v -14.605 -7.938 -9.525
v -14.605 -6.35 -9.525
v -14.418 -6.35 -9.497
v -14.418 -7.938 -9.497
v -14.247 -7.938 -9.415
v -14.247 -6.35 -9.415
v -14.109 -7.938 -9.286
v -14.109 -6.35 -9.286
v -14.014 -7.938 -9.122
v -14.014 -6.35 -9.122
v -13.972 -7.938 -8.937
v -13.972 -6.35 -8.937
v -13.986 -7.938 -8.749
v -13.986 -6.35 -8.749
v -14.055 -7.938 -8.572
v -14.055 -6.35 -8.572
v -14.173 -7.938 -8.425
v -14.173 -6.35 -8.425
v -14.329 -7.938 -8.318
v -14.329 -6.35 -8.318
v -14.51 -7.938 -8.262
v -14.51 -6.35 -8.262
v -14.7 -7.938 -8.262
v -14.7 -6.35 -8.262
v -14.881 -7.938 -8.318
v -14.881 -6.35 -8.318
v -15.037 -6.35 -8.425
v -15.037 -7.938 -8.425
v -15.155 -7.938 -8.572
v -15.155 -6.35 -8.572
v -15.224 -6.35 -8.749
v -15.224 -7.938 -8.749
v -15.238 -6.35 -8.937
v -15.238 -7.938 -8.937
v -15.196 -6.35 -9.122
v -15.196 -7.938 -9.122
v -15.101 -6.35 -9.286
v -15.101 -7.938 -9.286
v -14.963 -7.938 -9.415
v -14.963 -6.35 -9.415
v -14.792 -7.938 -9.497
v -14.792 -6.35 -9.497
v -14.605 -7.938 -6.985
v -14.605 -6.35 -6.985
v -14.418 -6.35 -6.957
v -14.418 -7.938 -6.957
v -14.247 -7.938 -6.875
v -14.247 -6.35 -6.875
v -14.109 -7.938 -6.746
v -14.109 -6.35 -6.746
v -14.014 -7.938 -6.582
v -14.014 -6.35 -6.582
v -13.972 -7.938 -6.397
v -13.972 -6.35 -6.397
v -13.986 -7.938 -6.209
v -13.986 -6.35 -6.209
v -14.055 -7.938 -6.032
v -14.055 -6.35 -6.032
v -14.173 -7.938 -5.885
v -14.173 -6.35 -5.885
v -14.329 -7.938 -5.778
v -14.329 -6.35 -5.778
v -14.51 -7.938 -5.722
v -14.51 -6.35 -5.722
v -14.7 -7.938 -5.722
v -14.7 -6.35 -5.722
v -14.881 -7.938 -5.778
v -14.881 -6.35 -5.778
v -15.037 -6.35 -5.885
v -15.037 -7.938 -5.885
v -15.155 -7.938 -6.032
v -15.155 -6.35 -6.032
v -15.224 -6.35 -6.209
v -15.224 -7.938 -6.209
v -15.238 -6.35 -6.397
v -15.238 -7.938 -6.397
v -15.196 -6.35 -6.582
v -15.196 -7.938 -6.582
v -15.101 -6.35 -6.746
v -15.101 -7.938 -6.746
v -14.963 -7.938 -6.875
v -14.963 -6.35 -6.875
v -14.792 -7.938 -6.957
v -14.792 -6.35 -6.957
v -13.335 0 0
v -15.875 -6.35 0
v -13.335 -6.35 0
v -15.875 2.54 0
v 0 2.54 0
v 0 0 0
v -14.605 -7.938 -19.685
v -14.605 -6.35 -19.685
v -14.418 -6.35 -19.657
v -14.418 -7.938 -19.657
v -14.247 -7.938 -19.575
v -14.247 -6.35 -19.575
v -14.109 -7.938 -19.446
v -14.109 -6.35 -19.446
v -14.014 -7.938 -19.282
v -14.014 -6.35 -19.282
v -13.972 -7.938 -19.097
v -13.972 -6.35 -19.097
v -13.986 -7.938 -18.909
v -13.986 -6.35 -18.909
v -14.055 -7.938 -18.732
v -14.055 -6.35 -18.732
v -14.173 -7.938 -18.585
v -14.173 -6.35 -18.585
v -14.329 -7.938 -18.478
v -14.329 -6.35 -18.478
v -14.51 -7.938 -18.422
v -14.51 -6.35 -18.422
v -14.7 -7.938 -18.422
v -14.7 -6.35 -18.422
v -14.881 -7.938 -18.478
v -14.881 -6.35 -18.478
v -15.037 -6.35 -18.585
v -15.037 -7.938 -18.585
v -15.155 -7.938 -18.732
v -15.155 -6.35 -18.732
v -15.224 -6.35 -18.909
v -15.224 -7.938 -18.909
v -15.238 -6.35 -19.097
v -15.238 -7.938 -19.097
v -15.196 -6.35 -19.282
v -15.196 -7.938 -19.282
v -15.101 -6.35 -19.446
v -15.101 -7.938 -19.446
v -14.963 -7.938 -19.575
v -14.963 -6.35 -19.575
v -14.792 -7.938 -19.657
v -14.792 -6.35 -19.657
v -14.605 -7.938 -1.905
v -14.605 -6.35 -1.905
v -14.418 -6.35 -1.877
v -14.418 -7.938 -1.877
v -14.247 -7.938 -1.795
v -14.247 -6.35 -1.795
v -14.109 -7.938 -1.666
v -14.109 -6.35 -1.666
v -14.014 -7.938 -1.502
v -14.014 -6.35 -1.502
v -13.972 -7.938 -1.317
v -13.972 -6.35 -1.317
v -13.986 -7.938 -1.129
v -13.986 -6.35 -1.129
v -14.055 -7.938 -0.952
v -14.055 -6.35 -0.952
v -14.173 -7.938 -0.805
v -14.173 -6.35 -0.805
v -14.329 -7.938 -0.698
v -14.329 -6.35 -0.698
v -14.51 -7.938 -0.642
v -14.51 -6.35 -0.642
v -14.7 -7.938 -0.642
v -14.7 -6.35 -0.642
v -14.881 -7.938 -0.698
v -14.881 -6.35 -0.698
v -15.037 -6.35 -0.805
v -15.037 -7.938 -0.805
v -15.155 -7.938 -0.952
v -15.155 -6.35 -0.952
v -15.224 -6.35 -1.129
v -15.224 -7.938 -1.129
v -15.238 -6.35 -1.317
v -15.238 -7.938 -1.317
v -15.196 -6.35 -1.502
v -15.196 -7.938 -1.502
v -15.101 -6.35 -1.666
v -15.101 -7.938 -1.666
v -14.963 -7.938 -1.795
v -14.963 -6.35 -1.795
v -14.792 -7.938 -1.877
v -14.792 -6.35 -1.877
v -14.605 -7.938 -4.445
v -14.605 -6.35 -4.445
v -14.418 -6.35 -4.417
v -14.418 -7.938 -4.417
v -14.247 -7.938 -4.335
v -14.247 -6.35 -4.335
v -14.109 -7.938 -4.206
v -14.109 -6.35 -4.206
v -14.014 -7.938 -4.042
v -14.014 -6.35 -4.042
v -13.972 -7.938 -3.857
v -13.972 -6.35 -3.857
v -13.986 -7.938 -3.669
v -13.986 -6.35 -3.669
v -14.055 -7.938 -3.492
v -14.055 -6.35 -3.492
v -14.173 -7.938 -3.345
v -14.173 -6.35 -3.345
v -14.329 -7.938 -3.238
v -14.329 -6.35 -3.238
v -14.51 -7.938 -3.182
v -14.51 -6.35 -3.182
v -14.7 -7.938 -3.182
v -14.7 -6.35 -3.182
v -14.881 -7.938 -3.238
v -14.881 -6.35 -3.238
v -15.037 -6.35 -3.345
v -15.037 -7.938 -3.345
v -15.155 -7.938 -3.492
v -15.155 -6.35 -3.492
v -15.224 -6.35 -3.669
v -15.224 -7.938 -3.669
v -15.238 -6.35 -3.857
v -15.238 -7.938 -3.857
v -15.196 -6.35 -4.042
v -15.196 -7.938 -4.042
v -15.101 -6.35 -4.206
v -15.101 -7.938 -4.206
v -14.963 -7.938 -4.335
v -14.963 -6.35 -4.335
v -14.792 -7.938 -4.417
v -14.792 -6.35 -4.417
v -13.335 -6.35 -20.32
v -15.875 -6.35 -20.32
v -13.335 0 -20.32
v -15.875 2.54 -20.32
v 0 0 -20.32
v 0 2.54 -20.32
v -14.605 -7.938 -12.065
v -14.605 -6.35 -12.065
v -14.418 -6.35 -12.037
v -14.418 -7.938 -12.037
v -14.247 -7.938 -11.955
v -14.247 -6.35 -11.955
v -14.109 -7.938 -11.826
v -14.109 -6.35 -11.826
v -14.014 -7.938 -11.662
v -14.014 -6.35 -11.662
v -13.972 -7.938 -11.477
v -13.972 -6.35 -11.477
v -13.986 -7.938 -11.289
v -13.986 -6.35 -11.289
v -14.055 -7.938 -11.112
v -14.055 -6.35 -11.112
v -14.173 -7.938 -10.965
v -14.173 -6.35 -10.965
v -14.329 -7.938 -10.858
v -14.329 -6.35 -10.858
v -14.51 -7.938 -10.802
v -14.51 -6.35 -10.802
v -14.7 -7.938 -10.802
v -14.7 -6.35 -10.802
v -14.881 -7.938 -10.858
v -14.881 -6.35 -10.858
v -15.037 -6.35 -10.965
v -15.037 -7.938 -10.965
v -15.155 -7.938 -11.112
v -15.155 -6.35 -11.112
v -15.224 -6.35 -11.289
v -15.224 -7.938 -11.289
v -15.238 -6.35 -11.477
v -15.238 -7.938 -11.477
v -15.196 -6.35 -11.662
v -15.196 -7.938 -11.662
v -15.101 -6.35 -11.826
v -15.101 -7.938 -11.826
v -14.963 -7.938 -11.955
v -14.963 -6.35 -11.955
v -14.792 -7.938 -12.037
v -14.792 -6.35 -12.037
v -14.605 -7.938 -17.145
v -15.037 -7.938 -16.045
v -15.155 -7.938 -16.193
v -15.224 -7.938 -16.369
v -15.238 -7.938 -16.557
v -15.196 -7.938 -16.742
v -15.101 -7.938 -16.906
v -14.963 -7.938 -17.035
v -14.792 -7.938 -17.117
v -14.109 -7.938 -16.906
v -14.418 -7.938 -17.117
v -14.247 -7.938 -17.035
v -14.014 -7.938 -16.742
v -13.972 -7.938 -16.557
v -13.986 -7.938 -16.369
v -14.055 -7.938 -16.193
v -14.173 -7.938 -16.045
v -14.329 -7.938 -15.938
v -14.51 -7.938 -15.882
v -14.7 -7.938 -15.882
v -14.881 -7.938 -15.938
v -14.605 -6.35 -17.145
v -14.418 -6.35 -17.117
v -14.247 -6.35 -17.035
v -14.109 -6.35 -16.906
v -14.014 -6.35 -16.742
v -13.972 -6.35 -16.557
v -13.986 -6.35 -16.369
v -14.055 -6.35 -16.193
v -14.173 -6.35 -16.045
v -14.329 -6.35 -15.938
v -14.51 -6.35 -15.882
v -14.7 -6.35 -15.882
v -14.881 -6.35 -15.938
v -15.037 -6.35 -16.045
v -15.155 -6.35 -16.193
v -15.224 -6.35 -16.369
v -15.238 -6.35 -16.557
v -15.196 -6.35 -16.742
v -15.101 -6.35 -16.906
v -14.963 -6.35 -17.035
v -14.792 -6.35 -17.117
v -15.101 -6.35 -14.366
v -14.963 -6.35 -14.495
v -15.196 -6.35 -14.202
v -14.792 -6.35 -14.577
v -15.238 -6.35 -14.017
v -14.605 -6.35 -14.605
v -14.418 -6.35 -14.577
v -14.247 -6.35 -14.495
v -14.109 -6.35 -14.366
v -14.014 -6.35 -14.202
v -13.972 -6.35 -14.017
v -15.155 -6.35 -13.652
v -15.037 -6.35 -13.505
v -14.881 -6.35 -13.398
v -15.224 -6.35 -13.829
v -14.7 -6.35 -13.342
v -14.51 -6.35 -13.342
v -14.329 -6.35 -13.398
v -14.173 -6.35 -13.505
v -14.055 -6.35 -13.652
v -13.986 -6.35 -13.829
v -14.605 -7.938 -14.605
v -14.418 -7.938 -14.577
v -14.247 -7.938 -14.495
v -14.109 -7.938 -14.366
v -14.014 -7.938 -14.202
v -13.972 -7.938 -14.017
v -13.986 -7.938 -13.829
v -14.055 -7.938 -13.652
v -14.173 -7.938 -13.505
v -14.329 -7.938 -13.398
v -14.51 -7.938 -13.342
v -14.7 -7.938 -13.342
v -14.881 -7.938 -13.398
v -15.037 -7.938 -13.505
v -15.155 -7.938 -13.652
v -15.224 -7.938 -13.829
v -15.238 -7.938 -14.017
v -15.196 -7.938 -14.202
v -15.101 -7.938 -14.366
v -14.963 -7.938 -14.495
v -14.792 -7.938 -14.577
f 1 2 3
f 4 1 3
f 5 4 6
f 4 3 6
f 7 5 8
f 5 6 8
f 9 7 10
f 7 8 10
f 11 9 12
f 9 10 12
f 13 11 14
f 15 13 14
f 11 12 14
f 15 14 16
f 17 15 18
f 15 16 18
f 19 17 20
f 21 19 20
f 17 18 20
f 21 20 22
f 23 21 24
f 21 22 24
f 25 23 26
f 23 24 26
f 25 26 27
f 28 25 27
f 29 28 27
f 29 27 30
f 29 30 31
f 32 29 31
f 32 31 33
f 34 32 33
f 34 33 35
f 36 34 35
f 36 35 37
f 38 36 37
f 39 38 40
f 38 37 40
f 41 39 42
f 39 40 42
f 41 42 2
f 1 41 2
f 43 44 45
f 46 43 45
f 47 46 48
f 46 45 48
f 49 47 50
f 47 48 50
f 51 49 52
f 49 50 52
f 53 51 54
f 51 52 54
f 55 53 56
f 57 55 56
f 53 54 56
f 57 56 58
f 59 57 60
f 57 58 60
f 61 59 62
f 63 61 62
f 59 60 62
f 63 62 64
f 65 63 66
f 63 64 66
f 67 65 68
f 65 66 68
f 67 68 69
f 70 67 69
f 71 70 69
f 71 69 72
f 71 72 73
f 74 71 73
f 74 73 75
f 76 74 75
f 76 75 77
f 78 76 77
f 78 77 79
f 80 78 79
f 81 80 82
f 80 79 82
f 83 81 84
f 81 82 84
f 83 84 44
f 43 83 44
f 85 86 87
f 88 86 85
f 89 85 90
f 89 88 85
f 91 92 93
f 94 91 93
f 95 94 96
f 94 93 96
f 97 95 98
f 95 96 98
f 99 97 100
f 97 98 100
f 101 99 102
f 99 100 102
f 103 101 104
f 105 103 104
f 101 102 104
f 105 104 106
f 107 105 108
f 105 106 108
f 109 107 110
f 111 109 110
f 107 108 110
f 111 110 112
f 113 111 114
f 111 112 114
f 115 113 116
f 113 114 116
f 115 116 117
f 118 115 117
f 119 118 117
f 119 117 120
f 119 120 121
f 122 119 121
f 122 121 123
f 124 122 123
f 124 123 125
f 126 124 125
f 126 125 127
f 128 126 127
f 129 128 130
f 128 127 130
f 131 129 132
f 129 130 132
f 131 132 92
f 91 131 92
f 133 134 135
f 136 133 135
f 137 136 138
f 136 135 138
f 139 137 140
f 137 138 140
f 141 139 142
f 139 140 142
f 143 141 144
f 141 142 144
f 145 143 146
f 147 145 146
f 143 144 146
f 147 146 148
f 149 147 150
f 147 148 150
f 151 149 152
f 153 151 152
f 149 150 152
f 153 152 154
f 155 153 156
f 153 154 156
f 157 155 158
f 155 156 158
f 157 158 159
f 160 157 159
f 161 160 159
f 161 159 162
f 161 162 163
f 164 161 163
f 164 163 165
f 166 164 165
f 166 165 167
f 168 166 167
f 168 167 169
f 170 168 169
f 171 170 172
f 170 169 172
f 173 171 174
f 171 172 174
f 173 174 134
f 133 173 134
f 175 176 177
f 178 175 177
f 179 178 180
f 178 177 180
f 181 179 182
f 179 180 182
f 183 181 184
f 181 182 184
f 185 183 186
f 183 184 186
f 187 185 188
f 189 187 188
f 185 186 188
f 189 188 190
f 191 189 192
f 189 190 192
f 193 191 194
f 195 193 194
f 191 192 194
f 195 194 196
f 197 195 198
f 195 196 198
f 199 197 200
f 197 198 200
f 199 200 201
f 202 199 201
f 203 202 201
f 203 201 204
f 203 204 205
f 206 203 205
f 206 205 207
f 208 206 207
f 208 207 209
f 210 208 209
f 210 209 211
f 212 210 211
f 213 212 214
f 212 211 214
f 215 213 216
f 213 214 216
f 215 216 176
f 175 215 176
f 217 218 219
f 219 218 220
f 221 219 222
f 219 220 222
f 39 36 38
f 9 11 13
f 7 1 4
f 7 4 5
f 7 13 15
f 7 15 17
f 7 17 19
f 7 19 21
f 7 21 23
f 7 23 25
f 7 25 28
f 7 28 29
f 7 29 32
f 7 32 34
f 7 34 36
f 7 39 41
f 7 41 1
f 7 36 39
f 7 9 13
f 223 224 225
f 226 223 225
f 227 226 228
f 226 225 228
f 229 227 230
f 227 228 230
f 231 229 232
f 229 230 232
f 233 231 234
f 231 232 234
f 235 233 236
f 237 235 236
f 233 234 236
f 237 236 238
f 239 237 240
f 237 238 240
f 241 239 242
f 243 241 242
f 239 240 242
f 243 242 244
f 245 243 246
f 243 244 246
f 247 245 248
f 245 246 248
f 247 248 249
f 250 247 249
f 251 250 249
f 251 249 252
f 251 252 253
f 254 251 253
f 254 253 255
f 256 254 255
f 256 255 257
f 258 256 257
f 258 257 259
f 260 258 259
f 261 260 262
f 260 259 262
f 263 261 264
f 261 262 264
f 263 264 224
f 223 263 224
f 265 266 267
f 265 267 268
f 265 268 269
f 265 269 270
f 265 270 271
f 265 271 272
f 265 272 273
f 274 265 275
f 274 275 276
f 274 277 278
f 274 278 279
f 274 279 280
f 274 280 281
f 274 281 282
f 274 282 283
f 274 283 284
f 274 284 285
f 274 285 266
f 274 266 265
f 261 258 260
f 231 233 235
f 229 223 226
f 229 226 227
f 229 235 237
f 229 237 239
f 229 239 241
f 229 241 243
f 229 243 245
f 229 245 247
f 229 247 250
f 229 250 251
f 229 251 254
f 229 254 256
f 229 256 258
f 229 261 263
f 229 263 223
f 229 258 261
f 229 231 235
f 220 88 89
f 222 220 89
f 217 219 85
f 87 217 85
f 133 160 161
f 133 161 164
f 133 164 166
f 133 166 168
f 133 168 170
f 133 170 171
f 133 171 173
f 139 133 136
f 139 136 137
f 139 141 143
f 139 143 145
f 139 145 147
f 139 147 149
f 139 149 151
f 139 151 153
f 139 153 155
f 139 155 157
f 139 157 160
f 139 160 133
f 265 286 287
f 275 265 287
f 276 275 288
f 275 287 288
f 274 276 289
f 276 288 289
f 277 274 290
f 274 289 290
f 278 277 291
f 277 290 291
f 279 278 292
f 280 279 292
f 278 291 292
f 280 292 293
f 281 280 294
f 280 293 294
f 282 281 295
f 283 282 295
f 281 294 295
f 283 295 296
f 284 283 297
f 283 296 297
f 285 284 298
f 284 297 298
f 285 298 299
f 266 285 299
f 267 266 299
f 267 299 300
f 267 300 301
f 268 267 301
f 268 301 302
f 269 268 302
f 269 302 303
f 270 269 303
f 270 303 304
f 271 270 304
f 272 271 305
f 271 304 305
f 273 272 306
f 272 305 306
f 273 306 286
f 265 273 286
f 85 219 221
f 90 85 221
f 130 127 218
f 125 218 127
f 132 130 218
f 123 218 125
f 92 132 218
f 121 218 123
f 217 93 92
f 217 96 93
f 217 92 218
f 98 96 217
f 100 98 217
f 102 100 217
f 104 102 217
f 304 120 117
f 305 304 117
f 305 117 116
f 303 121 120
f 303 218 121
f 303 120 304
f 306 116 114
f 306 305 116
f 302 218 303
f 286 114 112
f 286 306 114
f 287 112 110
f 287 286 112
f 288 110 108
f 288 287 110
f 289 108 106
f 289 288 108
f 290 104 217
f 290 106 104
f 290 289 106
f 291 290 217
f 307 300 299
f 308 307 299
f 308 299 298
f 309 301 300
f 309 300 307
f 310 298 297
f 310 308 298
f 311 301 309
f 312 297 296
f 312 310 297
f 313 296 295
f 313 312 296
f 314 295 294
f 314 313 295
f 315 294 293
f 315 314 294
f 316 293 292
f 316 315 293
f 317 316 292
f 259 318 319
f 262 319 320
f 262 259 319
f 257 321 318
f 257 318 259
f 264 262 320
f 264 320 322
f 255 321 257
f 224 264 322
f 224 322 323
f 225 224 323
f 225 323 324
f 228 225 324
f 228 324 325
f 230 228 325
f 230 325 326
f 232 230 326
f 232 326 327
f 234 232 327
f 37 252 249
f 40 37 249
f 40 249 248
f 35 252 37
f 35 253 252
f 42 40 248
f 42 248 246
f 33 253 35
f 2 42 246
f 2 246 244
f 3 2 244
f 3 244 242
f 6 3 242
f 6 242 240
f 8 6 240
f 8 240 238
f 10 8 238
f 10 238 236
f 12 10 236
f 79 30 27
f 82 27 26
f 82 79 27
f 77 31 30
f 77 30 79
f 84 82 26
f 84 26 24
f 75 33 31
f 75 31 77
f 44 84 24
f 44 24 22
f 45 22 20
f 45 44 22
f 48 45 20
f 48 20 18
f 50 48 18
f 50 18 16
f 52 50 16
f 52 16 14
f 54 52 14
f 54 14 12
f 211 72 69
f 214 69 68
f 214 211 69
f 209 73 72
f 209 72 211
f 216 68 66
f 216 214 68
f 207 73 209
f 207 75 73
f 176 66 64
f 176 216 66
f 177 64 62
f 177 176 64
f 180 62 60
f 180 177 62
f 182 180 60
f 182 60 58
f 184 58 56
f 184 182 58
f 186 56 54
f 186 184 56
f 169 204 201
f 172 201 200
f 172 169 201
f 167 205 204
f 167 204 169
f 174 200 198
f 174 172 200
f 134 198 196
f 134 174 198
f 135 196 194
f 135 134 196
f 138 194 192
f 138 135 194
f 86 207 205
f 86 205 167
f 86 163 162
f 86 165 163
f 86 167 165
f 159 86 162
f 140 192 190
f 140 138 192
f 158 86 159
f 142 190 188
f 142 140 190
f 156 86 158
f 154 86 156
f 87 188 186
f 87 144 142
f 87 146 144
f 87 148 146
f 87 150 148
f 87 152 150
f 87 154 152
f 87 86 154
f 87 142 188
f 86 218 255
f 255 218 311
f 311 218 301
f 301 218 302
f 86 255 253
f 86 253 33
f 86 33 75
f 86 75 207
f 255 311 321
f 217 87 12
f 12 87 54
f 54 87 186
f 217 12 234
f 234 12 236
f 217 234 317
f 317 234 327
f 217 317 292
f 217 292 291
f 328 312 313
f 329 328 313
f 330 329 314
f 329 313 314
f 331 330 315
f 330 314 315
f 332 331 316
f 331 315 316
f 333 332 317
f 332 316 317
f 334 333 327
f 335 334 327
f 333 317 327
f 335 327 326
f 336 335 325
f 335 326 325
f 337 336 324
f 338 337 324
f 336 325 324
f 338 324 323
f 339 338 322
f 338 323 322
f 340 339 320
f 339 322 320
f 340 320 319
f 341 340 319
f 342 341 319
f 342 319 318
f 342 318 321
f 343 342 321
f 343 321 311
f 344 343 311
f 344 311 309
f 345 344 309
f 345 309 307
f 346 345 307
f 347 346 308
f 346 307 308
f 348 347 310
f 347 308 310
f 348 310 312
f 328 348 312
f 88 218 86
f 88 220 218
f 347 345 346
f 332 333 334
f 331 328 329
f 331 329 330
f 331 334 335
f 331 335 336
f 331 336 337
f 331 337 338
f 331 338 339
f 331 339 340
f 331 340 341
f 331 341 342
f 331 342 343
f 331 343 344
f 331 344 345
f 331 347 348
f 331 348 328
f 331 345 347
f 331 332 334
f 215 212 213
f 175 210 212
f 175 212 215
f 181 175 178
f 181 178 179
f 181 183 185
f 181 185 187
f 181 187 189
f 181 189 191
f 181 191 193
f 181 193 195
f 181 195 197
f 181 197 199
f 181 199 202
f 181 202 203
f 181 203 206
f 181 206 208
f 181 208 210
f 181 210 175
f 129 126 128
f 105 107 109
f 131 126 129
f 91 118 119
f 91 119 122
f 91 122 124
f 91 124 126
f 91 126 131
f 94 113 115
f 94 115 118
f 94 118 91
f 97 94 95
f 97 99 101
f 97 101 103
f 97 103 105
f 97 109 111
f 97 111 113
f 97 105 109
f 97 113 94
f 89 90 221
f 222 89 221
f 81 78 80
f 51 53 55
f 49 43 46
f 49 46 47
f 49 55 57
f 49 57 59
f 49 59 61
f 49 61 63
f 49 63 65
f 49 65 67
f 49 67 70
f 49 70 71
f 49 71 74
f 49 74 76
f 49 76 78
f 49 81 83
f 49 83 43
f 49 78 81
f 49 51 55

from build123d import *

# Parameters (mm, degrees)
SKETCH1_W           = 15.875
SKETCH1_H           = 20.32
BOSS_EXTRUDE1_DEPTH = 2.54
SKETCH2_W           = 2.54
SKETCH2_H           = 20.32
BOSS_EXTRUDE2_DEPTH = 6.35
SKETCH3_R           = 0.635
BOSS_EXTRUDE3_DEPTH = 1.5875


with BuildPart() as part:
    # Sketch1 → Boss-Extrude1 (new body)
    with BuildSketch(Plane(origin=(0, 0, 0), x_dir=(1, 0, 0), z_dir=(0, 1, 0))):
        with Locations((-7.9375, 10.16)):
            Rectangle(SKETCH1_W, SKETCH1_H)
    extrude(amount=BOSS_EXTRUDE1_DEPTH)

    # Sketch2 → Boss-Extrude2 (add)
    with BuildSketch(Plane.XZ):
        with Locations((-14.605, -10.16)):
            Rectangle(SKETCH2_W, SKETCH2_H)
    extrude(amount=BOSS_EXTRUDE2_DEPTH)

    # Sketch3 → Boss-Extrude3 (add)
    with BuildSketch(Plane.XZ.offset(6.35)):
        with Locations(Location((-14.605, -1.27, 0), (0, 0, 270))):
            Circle(SKETCH3_R)
        with Locations(Location((-14.605, -3.81, 0), (0, 0, 270))):
            Circle(SKETCH3_R)
        with Locations(Location((-14.605, -6.35, 0), (0, 0, 270))):
            Circle(SKETCH3_R)
        with Locations(Location((-14.605, -8.89, 0), (0, 0, 270))):
            Circle(SKETCH3_R)
        with Locations(Location((-14.605, -11.43, 0), (0, 0, 270))):
            Circle(SKETCH3_R)
        with Locations(Location((-14.605, -13.97, 0), (0, 0, 270))):
            Circle(SKETCH3_R)
        with Locations(Location((-14.605, -16.51, 0), (0, 0, 270))):
            Circle(SKETCH3_R)
        with Locations(Location((-14.605, -19.05, 0), (0, 0, 270))):
            Circle(SKETCH3_R)
    extrude(amount=BOSS_EXTRUDE3_DEPTH)


solid = part.part
